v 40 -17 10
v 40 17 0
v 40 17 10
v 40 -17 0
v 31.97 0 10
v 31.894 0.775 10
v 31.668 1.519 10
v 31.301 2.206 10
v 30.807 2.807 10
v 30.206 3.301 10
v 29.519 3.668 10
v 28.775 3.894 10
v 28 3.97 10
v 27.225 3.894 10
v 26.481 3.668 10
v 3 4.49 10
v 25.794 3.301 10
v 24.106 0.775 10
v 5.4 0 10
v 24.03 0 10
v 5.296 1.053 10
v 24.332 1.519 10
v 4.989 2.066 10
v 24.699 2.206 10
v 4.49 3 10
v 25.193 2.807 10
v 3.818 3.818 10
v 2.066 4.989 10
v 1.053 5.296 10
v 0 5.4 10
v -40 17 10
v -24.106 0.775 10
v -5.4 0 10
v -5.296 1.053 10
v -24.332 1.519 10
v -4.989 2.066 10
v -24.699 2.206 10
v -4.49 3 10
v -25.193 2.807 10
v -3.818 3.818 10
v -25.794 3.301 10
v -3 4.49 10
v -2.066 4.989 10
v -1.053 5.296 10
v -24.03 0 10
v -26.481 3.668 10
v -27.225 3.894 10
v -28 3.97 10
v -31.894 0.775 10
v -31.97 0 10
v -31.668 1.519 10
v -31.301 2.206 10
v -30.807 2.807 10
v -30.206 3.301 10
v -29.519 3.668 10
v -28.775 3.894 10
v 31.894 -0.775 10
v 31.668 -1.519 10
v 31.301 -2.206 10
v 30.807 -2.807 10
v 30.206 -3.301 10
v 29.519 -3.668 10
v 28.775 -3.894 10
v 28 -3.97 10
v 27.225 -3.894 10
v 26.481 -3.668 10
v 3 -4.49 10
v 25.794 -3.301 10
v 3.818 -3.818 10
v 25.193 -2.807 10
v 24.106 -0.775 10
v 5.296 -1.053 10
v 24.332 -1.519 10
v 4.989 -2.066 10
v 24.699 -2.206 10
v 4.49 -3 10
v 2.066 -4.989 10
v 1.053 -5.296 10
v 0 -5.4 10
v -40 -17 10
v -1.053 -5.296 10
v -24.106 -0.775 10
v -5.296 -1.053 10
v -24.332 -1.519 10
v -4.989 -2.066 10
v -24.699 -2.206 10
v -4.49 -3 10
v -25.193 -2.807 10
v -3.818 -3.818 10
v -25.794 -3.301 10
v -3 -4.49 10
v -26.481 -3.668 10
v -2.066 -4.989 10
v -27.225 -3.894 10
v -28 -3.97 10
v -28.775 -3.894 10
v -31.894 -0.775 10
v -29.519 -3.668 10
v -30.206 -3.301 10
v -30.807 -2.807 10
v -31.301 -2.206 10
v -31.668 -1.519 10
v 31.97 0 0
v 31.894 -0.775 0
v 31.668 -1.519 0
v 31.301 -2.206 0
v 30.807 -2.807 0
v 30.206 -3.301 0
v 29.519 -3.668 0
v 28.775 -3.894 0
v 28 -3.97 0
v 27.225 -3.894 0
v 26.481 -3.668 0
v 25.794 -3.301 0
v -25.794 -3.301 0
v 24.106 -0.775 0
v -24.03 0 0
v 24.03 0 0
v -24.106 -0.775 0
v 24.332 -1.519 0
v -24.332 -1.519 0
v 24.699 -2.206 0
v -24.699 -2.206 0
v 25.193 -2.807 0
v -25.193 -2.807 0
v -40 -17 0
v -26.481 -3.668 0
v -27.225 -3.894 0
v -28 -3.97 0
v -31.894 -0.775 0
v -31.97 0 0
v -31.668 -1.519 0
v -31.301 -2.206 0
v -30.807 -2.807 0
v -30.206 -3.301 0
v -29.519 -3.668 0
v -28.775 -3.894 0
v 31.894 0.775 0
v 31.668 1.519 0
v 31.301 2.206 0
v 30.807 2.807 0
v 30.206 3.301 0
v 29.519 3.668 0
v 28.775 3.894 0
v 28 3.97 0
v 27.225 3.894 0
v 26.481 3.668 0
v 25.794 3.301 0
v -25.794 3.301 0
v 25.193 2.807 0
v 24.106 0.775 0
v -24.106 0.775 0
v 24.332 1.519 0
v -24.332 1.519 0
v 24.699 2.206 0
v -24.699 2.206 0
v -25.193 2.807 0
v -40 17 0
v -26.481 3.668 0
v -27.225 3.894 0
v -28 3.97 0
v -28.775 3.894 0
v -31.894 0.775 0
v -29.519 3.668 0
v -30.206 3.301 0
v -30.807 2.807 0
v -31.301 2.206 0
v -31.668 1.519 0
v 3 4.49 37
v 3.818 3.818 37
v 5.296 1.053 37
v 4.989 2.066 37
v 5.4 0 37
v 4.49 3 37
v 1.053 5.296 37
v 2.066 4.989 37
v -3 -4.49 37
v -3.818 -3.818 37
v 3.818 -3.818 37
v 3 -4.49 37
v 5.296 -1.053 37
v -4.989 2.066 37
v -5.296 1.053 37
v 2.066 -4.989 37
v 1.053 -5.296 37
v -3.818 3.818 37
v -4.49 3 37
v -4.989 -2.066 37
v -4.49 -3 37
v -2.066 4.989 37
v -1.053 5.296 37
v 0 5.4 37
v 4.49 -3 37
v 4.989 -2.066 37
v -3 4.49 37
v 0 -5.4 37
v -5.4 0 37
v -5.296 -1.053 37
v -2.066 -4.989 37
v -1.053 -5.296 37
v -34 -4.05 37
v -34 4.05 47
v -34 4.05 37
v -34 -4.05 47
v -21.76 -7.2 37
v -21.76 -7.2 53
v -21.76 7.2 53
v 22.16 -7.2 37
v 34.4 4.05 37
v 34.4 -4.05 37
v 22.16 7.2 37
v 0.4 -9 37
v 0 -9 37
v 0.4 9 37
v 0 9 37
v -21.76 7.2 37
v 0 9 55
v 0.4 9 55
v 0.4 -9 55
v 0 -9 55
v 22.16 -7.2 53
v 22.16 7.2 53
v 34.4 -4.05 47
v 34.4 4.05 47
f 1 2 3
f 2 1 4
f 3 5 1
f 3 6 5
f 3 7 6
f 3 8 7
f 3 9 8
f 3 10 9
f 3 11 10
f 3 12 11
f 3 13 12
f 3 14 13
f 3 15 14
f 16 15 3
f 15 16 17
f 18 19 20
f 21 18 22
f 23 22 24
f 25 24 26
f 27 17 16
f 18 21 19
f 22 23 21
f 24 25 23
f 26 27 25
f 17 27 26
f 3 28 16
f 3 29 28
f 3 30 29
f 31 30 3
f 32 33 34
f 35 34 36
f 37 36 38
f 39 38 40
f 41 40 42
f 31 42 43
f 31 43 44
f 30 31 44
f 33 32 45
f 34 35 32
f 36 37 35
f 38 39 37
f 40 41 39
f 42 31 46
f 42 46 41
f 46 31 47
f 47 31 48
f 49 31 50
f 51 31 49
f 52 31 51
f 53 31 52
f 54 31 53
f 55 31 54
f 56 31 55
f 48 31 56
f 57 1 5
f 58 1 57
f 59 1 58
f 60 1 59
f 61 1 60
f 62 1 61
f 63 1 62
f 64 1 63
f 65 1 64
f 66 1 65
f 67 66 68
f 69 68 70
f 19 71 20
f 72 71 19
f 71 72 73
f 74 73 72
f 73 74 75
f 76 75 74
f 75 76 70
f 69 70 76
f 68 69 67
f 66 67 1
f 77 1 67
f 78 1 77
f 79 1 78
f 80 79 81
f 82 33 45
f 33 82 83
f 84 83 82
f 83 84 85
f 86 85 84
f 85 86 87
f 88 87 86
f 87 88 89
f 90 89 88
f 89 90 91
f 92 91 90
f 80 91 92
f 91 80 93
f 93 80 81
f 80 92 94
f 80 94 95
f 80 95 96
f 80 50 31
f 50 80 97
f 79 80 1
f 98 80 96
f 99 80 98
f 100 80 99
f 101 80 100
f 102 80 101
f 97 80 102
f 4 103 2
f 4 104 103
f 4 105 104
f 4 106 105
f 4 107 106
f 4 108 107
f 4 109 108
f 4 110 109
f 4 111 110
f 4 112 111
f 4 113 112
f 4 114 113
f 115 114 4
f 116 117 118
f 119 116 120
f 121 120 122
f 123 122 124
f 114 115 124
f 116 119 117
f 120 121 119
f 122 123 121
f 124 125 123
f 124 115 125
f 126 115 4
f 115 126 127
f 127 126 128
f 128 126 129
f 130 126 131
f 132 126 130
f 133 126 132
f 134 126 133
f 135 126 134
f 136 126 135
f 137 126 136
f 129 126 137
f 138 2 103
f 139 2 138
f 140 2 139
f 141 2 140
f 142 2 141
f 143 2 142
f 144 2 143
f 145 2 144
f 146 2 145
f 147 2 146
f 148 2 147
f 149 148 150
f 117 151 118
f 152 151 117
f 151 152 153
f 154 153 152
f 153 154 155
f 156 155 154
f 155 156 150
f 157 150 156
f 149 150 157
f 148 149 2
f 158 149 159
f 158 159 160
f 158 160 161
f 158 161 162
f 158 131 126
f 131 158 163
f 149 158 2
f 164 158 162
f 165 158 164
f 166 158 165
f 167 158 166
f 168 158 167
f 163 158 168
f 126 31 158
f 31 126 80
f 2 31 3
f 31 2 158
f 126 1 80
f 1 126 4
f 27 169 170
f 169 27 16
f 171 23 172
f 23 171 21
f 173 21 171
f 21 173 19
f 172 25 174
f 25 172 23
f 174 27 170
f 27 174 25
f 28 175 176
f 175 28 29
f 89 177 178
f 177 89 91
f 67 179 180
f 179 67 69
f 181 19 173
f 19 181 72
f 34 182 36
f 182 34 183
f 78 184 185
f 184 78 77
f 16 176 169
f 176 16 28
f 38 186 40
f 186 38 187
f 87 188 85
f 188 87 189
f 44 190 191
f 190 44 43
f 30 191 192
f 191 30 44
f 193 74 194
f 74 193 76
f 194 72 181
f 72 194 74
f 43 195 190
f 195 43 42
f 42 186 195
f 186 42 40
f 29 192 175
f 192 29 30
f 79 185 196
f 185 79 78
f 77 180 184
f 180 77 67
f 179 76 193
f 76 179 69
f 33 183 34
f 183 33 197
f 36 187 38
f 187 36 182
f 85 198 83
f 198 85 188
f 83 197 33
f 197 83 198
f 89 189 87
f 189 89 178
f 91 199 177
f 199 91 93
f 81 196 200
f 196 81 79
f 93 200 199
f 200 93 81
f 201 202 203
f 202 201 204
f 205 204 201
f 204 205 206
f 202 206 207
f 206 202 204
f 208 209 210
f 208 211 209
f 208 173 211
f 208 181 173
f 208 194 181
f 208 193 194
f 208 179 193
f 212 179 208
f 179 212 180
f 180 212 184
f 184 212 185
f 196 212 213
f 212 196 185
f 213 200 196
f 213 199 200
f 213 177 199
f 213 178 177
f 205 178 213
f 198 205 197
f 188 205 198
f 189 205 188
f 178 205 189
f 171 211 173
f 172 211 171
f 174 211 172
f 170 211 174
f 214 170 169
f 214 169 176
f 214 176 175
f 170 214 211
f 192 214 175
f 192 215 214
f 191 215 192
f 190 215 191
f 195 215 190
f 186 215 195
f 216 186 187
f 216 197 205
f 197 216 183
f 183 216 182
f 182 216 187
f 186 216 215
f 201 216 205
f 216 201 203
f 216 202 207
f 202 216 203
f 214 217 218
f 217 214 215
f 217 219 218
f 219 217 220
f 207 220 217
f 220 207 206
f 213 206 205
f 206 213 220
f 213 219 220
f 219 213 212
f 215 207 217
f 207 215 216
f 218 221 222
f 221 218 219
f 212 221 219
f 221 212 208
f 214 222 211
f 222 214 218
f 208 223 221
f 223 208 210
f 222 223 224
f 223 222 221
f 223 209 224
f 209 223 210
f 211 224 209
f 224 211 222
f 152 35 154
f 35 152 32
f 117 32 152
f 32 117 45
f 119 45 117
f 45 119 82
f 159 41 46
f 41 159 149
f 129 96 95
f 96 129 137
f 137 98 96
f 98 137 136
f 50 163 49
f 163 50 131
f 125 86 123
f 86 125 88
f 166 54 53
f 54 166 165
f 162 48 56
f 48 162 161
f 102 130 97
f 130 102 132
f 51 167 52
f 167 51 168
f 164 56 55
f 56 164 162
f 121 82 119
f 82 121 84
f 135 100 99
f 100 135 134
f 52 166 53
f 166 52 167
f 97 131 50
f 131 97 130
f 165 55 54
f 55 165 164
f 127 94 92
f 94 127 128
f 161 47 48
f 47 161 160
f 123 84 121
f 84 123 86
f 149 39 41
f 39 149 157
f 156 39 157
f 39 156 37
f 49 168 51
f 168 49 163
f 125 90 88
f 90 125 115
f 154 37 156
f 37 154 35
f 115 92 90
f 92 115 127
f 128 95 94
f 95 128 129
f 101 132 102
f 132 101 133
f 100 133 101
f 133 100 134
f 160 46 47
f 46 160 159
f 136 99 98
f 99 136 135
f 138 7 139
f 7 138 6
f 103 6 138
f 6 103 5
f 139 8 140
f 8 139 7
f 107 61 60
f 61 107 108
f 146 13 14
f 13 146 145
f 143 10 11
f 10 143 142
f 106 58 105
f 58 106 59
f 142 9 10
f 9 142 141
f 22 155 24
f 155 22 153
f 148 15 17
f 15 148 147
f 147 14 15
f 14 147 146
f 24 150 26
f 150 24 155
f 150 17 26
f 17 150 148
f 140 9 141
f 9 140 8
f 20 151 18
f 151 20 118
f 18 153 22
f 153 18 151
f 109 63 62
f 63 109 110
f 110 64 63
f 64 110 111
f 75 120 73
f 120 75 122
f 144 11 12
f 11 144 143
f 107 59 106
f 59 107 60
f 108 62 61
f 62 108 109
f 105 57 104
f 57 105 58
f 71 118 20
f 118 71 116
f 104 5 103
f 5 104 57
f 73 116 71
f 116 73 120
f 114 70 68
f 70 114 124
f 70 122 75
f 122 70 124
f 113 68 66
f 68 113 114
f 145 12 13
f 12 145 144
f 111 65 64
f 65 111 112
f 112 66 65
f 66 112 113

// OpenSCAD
$fn = 32;

// ----------------------------------------------------------------------
// Boat cleat: 80 mm base, horn 46 mm up
// ----------------------------------------------------------------------

// --- parameters (mm) ---
base_l = 80;              // base length
base_w = 34;              // base width
base_t = 10;              // base thickness
horn_len = 68;            // horn length
horn_d = 18;              // horn diameter at the middle
horn_z = 46;              // horn axis height
end_drop = 8;             // how far the horn tips drop
post_d = 10.8;            // centre post diameter
holes_d = 7.94;           // fixing holes
hole_x = 28;              // fixing hole spacing

difference() {
  union() {
    translate([-40, -17, 0]) cube([base_l, base_w, base_t]);
    /* centre post, sunk 1 mm into the base */
    translate([0, 0, 9]) cylinder(h = 37, d = post_d);
    /* horn: a hull chain of boxes, full in the middle and lighter at the tips */
    hull() {
      translate([-34, -4.05, 37]) cube([0.4, 8.1, 10], center = false);
      translate([-21.76, -7.2, 37]) cube([0.4, 14.4, 16], center = false);
    }
    hull() {
      translate([-21.76, -7.2, 37]) cube([0.4, 14.4, 16], center = false);
      translate([0, -9, 37]) cube([0.4, 18, 18], center = false);
    }
    hull() {
      translate([0, -9, 37]) cube([0.4, 18, 18], center = false);
      translate([21.76, -7.2, 37]) cube([0.4, 14.4, 16], center = false);
    }
    hull() {
      translate([21.76, -7.2, 37]) cube([0.4, 14.4, 16], center = false);
      translate([34, -4.05, 37]) cube([0.4, 8.1, 10], center = false);
    }
  }
  translate([-28, 0, -2.5]) cylinder(h = base_t + 5, d = holes_d);
  translate([28, 0, -2.5]) cylinder(h = base_t + 5, d = holes_d);
}
